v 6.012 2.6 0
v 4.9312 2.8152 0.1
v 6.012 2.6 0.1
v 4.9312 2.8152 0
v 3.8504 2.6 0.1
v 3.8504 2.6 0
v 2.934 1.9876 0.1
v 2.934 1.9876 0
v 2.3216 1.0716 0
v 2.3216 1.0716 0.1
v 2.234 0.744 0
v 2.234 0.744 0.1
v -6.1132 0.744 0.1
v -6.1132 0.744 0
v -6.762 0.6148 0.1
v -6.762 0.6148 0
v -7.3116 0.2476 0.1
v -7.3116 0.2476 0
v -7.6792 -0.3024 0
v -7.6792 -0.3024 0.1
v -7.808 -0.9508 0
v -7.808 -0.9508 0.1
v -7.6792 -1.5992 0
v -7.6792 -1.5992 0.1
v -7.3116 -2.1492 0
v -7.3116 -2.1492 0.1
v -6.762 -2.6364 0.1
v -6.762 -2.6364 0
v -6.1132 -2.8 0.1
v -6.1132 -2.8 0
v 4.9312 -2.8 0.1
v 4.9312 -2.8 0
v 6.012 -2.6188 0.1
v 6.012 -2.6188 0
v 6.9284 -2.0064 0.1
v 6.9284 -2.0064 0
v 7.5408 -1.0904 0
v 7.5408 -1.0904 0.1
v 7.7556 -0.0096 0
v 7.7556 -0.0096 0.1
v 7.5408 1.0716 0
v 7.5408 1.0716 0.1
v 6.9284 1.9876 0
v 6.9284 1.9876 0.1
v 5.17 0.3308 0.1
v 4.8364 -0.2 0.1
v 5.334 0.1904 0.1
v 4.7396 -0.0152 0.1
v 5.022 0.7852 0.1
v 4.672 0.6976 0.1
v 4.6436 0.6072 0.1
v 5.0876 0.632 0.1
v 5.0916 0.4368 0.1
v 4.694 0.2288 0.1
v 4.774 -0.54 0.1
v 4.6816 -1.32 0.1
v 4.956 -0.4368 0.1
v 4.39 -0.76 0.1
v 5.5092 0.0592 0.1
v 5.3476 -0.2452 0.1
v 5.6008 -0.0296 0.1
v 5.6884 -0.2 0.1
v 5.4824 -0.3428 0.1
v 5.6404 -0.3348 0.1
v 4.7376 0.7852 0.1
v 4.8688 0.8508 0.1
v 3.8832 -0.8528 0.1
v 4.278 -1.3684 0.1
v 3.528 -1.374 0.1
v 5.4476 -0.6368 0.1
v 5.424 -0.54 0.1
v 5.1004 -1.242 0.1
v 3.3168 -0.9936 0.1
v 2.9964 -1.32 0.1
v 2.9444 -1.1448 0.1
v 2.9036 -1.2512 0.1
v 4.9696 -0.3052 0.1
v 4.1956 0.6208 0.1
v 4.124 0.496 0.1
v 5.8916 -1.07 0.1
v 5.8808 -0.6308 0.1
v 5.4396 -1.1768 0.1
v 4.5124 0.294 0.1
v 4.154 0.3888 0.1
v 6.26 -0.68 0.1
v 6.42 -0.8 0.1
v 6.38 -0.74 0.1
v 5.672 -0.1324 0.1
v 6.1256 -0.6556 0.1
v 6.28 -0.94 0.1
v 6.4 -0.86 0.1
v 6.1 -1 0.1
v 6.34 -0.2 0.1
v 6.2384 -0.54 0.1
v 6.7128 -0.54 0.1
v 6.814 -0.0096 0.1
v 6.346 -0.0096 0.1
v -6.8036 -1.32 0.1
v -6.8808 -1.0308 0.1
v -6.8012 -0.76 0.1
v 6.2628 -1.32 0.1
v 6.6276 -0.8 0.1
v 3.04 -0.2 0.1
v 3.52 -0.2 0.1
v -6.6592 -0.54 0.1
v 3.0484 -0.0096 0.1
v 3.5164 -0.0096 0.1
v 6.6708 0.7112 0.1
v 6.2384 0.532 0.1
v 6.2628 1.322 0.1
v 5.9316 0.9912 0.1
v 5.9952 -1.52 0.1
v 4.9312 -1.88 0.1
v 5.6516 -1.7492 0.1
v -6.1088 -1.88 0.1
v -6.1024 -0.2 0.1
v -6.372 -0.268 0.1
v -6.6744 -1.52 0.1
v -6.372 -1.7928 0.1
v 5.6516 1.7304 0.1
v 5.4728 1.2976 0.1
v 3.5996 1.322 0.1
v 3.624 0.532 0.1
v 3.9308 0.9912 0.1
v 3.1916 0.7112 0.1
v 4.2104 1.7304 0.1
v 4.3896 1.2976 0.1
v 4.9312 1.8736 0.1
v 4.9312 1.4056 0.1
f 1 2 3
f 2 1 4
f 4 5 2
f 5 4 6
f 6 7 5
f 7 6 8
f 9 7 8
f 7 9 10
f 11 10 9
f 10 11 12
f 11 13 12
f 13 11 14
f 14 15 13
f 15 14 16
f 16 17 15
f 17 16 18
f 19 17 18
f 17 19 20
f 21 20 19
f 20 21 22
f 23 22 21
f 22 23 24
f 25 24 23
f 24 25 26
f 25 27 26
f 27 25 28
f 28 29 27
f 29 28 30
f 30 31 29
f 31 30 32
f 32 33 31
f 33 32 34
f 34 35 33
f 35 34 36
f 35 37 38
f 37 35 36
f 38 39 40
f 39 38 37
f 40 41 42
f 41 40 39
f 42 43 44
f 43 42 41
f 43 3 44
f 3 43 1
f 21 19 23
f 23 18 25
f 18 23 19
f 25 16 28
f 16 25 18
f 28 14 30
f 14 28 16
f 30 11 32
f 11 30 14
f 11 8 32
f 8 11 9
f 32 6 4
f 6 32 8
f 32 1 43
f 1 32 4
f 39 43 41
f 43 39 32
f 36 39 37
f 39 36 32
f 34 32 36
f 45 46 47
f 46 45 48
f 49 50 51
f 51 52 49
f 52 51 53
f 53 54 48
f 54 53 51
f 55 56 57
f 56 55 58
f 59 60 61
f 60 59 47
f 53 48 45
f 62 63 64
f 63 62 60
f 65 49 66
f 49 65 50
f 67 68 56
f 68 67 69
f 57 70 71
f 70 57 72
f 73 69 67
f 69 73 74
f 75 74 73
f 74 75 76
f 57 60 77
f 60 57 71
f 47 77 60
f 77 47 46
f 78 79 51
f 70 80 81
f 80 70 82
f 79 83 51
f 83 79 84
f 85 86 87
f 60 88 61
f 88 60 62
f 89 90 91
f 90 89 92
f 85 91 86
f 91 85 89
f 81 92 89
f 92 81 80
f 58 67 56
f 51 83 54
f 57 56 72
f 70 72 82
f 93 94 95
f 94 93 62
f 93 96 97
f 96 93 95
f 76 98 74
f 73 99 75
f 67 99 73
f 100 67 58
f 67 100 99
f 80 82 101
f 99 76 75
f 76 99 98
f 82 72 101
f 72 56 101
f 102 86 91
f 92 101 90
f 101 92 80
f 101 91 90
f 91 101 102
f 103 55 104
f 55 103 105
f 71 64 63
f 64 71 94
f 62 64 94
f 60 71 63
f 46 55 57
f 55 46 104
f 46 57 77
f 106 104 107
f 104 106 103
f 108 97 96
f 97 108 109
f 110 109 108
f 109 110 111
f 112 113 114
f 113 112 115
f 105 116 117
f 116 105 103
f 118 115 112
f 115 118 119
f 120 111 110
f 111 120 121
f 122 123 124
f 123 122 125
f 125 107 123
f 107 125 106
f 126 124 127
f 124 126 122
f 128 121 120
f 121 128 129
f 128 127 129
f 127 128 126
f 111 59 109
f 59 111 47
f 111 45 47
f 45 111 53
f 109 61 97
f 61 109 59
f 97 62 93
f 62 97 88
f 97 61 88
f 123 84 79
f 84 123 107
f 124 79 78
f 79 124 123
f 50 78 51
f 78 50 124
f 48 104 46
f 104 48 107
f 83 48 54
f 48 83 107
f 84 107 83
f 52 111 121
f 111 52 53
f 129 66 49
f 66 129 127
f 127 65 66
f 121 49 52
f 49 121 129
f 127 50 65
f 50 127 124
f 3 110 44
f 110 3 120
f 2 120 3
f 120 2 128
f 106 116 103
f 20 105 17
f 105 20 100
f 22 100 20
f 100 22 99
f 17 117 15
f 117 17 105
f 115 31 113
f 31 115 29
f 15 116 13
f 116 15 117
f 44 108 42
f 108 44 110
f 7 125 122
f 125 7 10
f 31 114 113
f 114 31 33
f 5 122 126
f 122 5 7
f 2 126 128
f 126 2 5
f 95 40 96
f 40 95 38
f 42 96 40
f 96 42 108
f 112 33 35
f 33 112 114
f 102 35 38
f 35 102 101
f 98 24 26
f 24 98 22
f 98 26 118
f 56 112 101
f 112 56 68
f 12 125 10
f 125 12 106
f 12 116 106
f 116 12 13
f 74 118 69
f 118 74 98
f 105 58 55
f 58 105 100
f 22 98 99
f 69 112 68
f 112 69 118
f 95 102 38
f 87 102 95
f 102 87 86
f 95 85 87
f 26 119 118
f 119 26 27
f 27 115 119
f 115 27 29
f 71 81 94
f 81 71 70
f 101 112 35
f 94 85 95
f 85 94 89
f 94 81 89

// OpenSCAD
use <../lib.scad>
function ldraw_lib__6153754p() = [
// 0 Sticker  0.7 x  1.9 with Black Surfer in Orange Sunset
// 0 Name: 6153754p.dat
// 0 Author: Magnus Forsberg [MagFors]
// 0 !LDRAW_ORG Part UPDATE 2016-01
// 0 !LICENSE Licensed under CC BY 4.0 : see CAreadme.txt
// 
// 0 BFC CERTIFY CCW
  [0,"BFC","CERTIFY"],
  [0,"BFC","CCW"],
// 
// 0 !KEYWORDS Beetle, set 10252, Volkswagen, VW
// 
// 0 !HISTORY 2016-12-31 [PTadmin] Official Update 2016-01
// 
// 
// 4 16 12.328 0 7.038 12.328 -0.25 7.038 15.03 -0.25 6.5 15.03 0 6.5
  [4,16,12.328,0,7.038,12.328,-0.25,7.038,15.03,-0.25,6.5,15.03,0,6.5],
// 4 16 9.626 0 6.5 9.626 -0.25 6.5 12.328 -0.25 7.038 12.328 0 7.038
  [4,16,9.626,0,6.5,9.626,-0.25,6.5,12.328,-0.25,7.038,12.328,0,7.038],
// 4 16 7.335 0 4.969 7.335 -0.25 4.969 9.626 -0.25 6.5 9.626 0 6.5
  [4,16,7.335,0,4.969,7.335,-0.25,4.969,9.626,-0.25,6.5,9.626,0,6.5],
// 4 16 5.804 0 2.679 5.804 -0.25 2.679 7.335 -0.25 4.969 7.335 0 4.969
  [4,16,5.804,0,2.679,5.804,-0.25,2.679,7.335,-0.25,4.969,7.335,0,4.969],
// 4 16 5.585 0 1.86 5.585 -0.25 1.86 5.804 -0.25 2.679 5.804 0 2.679
  [4,16,5.585,0,1.86,5.585,-0.25,1.86,5.804,-0.25,2.679,5.804,0,2.679],
// 4 16 -15.283 0 1.86 -15.283 -0.25 1.86 5.585 -0.25 1.86 5.585 0 1.86
  [4,16,-15.283,0,1.86,-15.283,-0.25,1.86,5.585,-0.25,1.86,5.585,0,1.86],
// 4 16 -16.905 0 1.537 -16.905 -0.25 1.537 -15.283 -0.25 1.86 -15.283 0 1.86
  [4,16,-16.905,0,1.537,-16.905,-0.25,1.537,-15.283,-0.25,1.86,-15.283,0,1.86],
// 4 16 -18.279 0 0.619 -18.279 -0.25 0.619 -16.905 -0.25 1.537 -16.905 0 1.537
  [4,16,-18.279,0,0.619,-18.279,-0.25,0.619,-16.905,-0.25,1.537,-16.905,0,1.537],
// 4 16 -19.198 0 -0.756 -19.198 -0.25 -0.756 -18.279 -0.25 0.619 -18.279 0 0.619
  [4,16,-19.198,0,-0.756,-19.198,-0.25,-0.756,-18.279,-0.25,0.619,-18.279,0,0.619],
// 4 16 -19.52 0 -2.377 -19.52 -0.25 -2.377 -19.198 -0.25 -0.756 -19.198 0 -0.756
  [4,16,-19.52,0,-2.377,-19.52,-0.25,-2.377,-19.198,-0.25,-0.756,-19.198,0,-0.756],
// 4 16 -19.198 0 -3.998 -19.198 -0.25 -3.998 -19.52 -0.25 -2.377 -19.52 0 -2.377
  [4,16,-19.198,0,-3.998,-19.198,-0.25,-3.998,-19.52,-0.25,-2.377,-19.52,0,-2.377],
// 4 16 -18.279 0 -5.373 -18.279 -0.25 -5.373 -19.198 -0.25 -3.998 -19.198 0 -3.998
  [4,16,-18.279,0,-5.373,-18.279,-0.25,-5.373,-19.198,-0.25,-3.998,-19.198,0,-3.998],
// 4 16 -16.905 0 -6.591 -16.905 -0.25 -6.591 -18.279 -0.25 -5.373 -18.279 0 -5.373
  [4,16,-16.905,0,-6.591,-16.905,-0.25,-6.591,-18.279,-0.25,-5.373,-18.279,0,-5.373],
// 4 16 -15.283 0 -7 -15.283 -0.25 -7 -16.905 -0.25 -6.591 -16.905 0 -6.591
  [4,16,-15.283,0,-7,-15.283,-0.25,-7,-16.905,-0.25,-6.591,-16.905,0,-6.591],
// 4 16 12.328 0 -7 12.328 -0.25 -7 -15.283 -0.25 -7 -15.283 0 -7
  [4,16,12.328,0,-7,12.328,-0.25,-7,-15.283,-0.25,-7,-15.283,0,-7],
// 4 16 15.03 0 -6.547 15.03 -0.25 -6.547 12.328 -0.25 -7 12.328 0 -7
  [4,16,15.03,0,-6.547,15.03,-0.25,-6.547,12.328,-0.25,-7,12.328,0,-7],
// 4 16 17.321 0 -5.016 17.321 -0.25 -5.016 15.03 -0.25 -6.547 15.03 0 -6.547
  [4,16,17.321,0,-5.016,17.321,-0.25,-5.016,15.03,-0.25,-6.547,15.03,0,-6.547],
// 4 16 18.852 0 -2.726 18.852 -0.25 -2.726 17.321 -0.25 -5.016 17.321 0 -5.016
  [4,16,18.852,0,-2.726,18.852,-0.25,-2.726,17.321,-0.25,-5.016,17.321,0,-5.016],
// 4 16 19.389 0 -0.024 19.389 -0.25 -0.024 18.852 -0.25 -2.726 18.852 0 -2.726
  [4,16,19.389,0,-0.024,19.389,-0.25,-0.024,18.852,-0.25,-2.726,18.852,0,-2.726],
// 4 16 18.852 0 2.679 18.852 -0.25 2.679 19.389 -0.25 -0.024 19.389 0 -0.024
  [4,16,18.852,0,2.679,18.852,-0.25,2.679,19.389,-0.25,-0.024,19.389,0,-0.024],
// 4 16 17.321 0 4.969 17.321 -0.25 4.969 18.852 -0.25 2.679 18.852 0 2.679
  [4,16,17.321,0,4.969,17.321,-0.25,4.969,18.852,-0.25,2.679,18.852,0,2.679],
// 4 16 15.03 0 6.5 15.03 -0.25 6.5 17.321 -0.25 4.969 17.321 0 4.969
  [4,16,15.03,0,6.5,15.03,-0.25,6.5,17.321,-0.25,4.969,17.321,0,4.969],
// 5 24 12.328 -0.25 7.038 12.328 0 7.038 9.626 -0.25 6.5 15.03 -0.25 6.5
  [5,24,12.328,-0.25,7.038,12.328,0,7.038,9.626,-0.25,6.5,15.03,-0.25,6.5],
// 5 24 9.626 -0.25 6.5 9.626 0 6.5 7.335 -0.25 4.969 12.328 -0.25 7.038
  [5,24,9.626,-0.25,6.5,9.626,0,6.5,7.335,-0.25,4.969,12.328,-0.25,7.038],
// 5 24 7.335 -0.25 4.969 7.335 0 4.969 5.804 -0.25 2.679 9.626 -0.25 6.5
  [5,24,7.335,-0.25,4.969,7.335,0,4.969,5.804,-0.25,2.679,9.626,-0.25,6.5],
// 5 24 5.804 -0.25 2.679 5.804 0 2.679 5.585 -0.25 1.86 7.335 -0.25 4.969
  [5,24,5.804,-0.25,2.679,5.804,0,2.679,5.585,-0.25,1.86,7.335,-0.25,4.969],
// 5 24 -15.283 -0.25 1.86 -15.283 0 1.86 -16.905 -0.25 1.537 5.585 -0.25 1.86
  [5,24,-15.283,-0.25,1.86,-15.283,0,1.86,-16.905,-0.25,1.537,5.585,-0.25,1.86],
// 5 24 -16.905 -0.25 1.537 -16.905 0 1.537 -18.279 -0.25 0.619 -15.283 -0.25 1.86
  [5,24,-16.905,-0.25,1.537,-16.905,0,1.537,-18.279,-0.25,0.619,-15.283,-0.25,1.86],
// 5 24 -18.279 -0.25 0.619 -18.279 0 0.619 -19.198 -0.25 -0.756 -16.905 -0.25 1.537
  [5,24,-18.279,-0.25,0.619,-18.279,0,0.619,-19.198,-0.25,-0.756,-16.905,-0.25,1.537],
// 5 24 -19.198 -0.25 -0.756 -19.198 0 -0.756 -19.52 -0.25 -2.377 -18.279 -0.25 0.619
  [5,24,-19.198,-0.25,-0.756,-19.198,0,-0.756,-19.52,-0.25,-2.377,-18.279,-0.25,0.619],
// 5 24 -19.52 -0.25 -2.377 -19.52 0 -2.377 -19.198 -0.25 -3.998 -19.198 -0.25 -0.756
  [5,24,-19.52,-0.25,-2.377,-19.52,0,-2.377,-19.198,-0.25,-3.998,-19.198,-0.25,-0.756],
// 5 24 -19.198 -0.25 -3.998 -19.198 0 -3.998 -18.279 -0.25 -5.373 -19.52 -0.25 -2.377
  [5,24,-19.198,-0.25,-3.998,-19.198,0,-3.998,-18.279,-0.25,-5.373,-19.52,-0.25,-2.377],
// 5 24 -18.279 -0.25 -5.373 -18.279 0 -5.373 -16.905 -0.25 -6.591 -19.198 -0.25 -3.998
  [5,24,-18.279,-0.25,-5.373,-18.279,0,-5.373,-16.905,-0.25,-6.591,-19.198,-0.25,-3.998],
// 5 24 -16.905 -0.25 -6.591 -16.905 0 -6.591 -15.283 -0.25 -7 -18.279 -0.25 -5.373
  [5,24,-16.905,-0.25,-6.591,-16.905,0,-6.591,-15.283,-0.25,-7,-18.279,-0.25,-5.373],
// 5 24 -15.283 -0.25 -7 -15.283 0 -7 12.328 -0.25 -7 -16.905 -0.25 -6.591
  [5,24,-15.283,-0.25,-7,-15.283,0,-7,12.328,-0.25,-7,-16.905,-0.25,-6.591],
// 5 24 12.328 -0.25 -7 12.328 0 -7 15.03 -0.25 -6.547 -15.283 -0.25 -7
  [5,24,12.328,-0.25,-7,12.328,0,-7,15.03,-0.25,-6.547,-15.283,-0.25,-7],
// 5 24 15.03 -0.25 -6.547 15.03 0 -6.547 17.321 -0.25 -5.016 12.328 -0.25 -7
  [5,24,15.03,-0.25,-6.547,15.03,0,-6.547,17.321,-0.25,-5.016,12.328,-0.25,-7],
// 5 24 17.321 -0.25 -5.016 17.321 0 -5.016 18.852 -0.25 -2.726 15.03 -0.25 -6.547
  [5,24,17.321,-0.25,-5.016,17.321,0,-5.016,18.852,-0.25,-2.726,15.03,-0.25,-6.547],
// 5 24 18.852 -0.25 -2.726 18.852 0 -2.726 19.389 -0.25 -0.024 17.321 -0.25 -5.016
  [5,24,18.852,-0.25,-2.726,18.852,0,-2.726,19.389,-0.25,-0.024,17.321,-0.25,-5.016],
// 5 24 19.389 -0.25 -0.024 19.389 0 -0.024 18.852 -0.25 2.679 18.852 -0.25 -2.726
  [5,24,19.389,-0.25,-0.024,19.389,0,-0.024,18.852,-0.25,2.679,18.852,-0.25,-2.726],
// 5 24 18.852 -0.25 2.679 18.852 0 2.679 17.321 -0.25 4.969 19.389 -0.25 -0.024
  [5,24,18.852,-0.25,2.679,18.852,0,2.679,17.321,-0.25,4.969,19.389,-0.25,-0.024],
// 5 24 17.321 -0.25 4.969 17.321 0 4.969 15.03 -0.25 6.5 18.852 -0.25 2.679
  [5,24,17.321,-0.25,4.969,17.321,0,4.969,15.03,-0.25,6.5,18.852,-0.25,2.679],
// 5 24 15.03 -0.25 6.5 15.03 0 6.5 17.321 -0.25 4.969 12.328 -0.25 7.038
  [5,24,15.03,-0.25,6.5,15.03,0,6.5,17.321,-0.25,4.969,12.328,-0.25,7.038],
// 
// 3 16 -19.52 0 -2.377 -19.198 0 -0.756 -19.198 0 -3.998
  [3,16,-19.52,0,-2.377,-19.198,0,-0.756,-19.198,0,-3.998],
// 4 16 -18.279 0 -5.373 -19.198 0 -3.998 -19.198 0 -0.756 -18.279 0 0.619
  [4,16,-18.279,0,-5.373,-19.198,0,-3.998,-19.198,0,-0.756,-18.279,0,0.619],
// 4 16 -18.279 0 -5.373 -18.279 0 0.619 -16.905 0 1.537 -16.905 0 -6.591
  [4,16,-18.279,0,-5.373,-18.279,0,0.619,-16.905,0,1.537,-16.905,0,-6.591],
// 4 16 -15.283 0 -7 -16.905 0 -6.591 -16.905 0 1.537 -15.283 0 1.86
  [4,16,-15.283,0,-7,-16.905,0,-6.591,-16.905,0,1.537,-15.283,0,1.86],
// 4 16 -15.283 0 1.86 5.585 0 1.86 12.328 0 -7 -15.283 0 -7
  [4,16,-15.283,0,1.86,5.585,0,1.86,12.328,0,-7,-15.283,0,-7],
// 4 16 12.328 0 -7 5.585 0 1.86 5.804 0 2.679 7.335 0 4.969
  [4,16,12.328,0,-7,5.585,0,1.86,5.804,0,2.679,7.335,0,4.969],
// 4 16 12.328 0 -7 7.335 0 4.969 9.626 0 6.5 12.328 0 7.038
  [4,16,12.328,0,-7,7.335,0,4.969,9.626,0,6.5,12.328,0,7.038],
// 4 16 12.328 0 -7 12.328 0 7.038 15.03 0 6.5 17.321 0 4.969
  [4,16,12.328,0,-7,12.328,0,7.038,15.03,0,6.5,17.321,0,4.969],
// 4 16 12.328 0 -7 17.321 0 4.969 18.852 0 2.679 19.389 0 -0.024
  [4,16,12.328,0,-7,17.321,0,4.969,18.852,0,2.679,19.389,0,-0.024],
// 4 16 12.328 0 -7 19.389 0 -0.024 18.852 0 -2.726 17.321 0 -5.016
  [4,16,12.328,0,-7,19.389,0,-0.024,18.852,0,-2.726,17.321,0,-5.016],
// 3 16 15.03 0 -6.547 12.328 0 -7 17.321 0 -5.016
  [3,16,15.03,0,-6.547,12.328,0,-7,17.321,0,-5.016],
// 
// 4 0 11.849 -0.25 -0.038 12.091 -0.25 -0.5 13.335 -0.25 0.476 12.925 -0.25 0.827
  [4,0,11.849,-0.25,-0.038,12.091,-0.25,-0.5,13.335,-0.25,0.476,12.925,-0.25,0.827],
// 3 0 12.555 -0.25 1.963 11.68 -0.25 1.744 11.609 -0.25 1.518
  [3,0,12.555,-0.25,1.963,11.68,-0.25,1.744,11.609,-0.25,1.518],
// 4 0 12.719 -0.25 1.58 12.555 -0.25 1.963 11.609 -0.25 1.518 12.729 -0.25 1.092
  [4,0,12.719,-0.25,1.58,12.555,-0.25,1.963,11.609,-0.25,1.518,12.729,-0.25,1.092],
// 4 0 12.729 -0.25 1.092 11.609 -0.25 1.518 11.735 -0.25 0.572 11.849 -0.25 -0.038
  [4,0,12.729,-0.25,1.092,11.609,-0.25,1.518,11.735,-0.25,0.572,11.849,-0.25,-0.038],
// 4 0 11.704 -0.25 -3.3 12.39 -0.25 -1.092 11.935 -0.25 -1.35 10.975 -0.25 -1.9
  [4,0,11.704,-0.25,-3.3,12.39,-0.25,-1.092,11.935,-0.25,-1.35,10.975,-0.25,-1.9],
// 4 0 13.773 -0.25 0.148 13.335 -0.25 0.476 13.369 -0.25 -0.613 14.002 -0.25 -0.074
  [4,0,13.773,-0.25,0.148,13.335,-0.25,0.476,13.369,-0.25,-0.613,14.002,-0.25,-0.074],
// 3 0 12.729 -0.25 1.092 11.849 -0.25 -0.038 12.925 -0.25 0.827
  [3,0,12.729,-0.25,1.092,11.849,-0.25,-0.038,12.925,-0.25,0.827],
// 4 0 14.221 -0.25 -0.5 13.369 -0.25 -0.613 13.706 -0.25 -0.857 14.101 -0.25 -0.837
  [4,0,14.221,-0.25,-0.5,13.369,-0.25,-0.613,13.706,-0.25,-0.857,14.101,-0.25,-0.837],
// 4 0 12.555 -0.25 1.963 12.172 -0.25 2.127 11.844 -0.25 1.963 11.68 -0.25 1.744
  [4,0,12.555,-0.25,1.963,12.172,-0.25,2.127,11.844,-0.25,1.963,11.68,-0.25,1.744],
// 4 0 9.708 -0.25 -2.132 8.82 -0.25 -3.435 10.695 -0.25 -3.421 11.704 -0.25 -3.3
  [4,0,9.708,-0.25,-2.132,8.82,-0.25,-3.435,10.695,-0.25,-3.421,11.704,-0.25,-3.3],
// 4 0 12.39 -0.25 -1.092 12.751 -0.25 -3.105 13.619 -0.25 -1.592 13.56 -0.25 -1.35
  [4,0,12.39,-0.25,-1.092,12.751,-0.25,-3.105,13.619,-0.25,-1.592,13.56,-0.25,-1.35],
// 4 0 8.292 -0.25 -2.484 7.491 -0.25 -3.3 8.82 -0.25 -3.435 9.708 -0.25 -2.132
  [4,0,8.292,-0.25,-2.484,7.491,-0.25,-3.3,8.82,-0.25,-3.435,9.708,-0.25,-2.132],
// 4 0 7.361 -0.25 -2.862 7.259 -0.25 -3.128 7.491 -0.25 -3.3 8.292 -0.25 -2.484
  [4,0,7.361,-0.25,-2.862,7.259,-0.25,-3.128,7.491,-0.25,-3.3,8.292,-0.25,-2.484],
// 4 0 13.369 -0.25 -0.613 12.424 -0.25 -0.763 12.39 -0.25 -1.092 13.56 -0.25 -1.35
  [4,0,13.369,-0.25,-0.613,12.424,-0.25,-0.763,12.39,-0.25,-1.092,13.56,-0.25,-1.35],
// 4 0 12.091 -0.25 -0.5 12.424 -0.25 -0.763 13.369 -0.25 -0.613 13.335 -0.25 0.476
  [4,0,12.091,-0.25,-0.5,12.424,-0.25,-0.763,13.369,-0.25,-0.613,13.335,-0.25,0.476],
// 3 0 10.489 -0.25 1.552 10.31 -0.25 1.24 11.609 -0.25 1.518
  [3,0,10.489,-0.25,1.552,10.31,-0.25,1.24,11.609,-0.25,1.518],
// 4 0 13.619 -0.25 -1.592 13.599 -0.25 -2.942 14.729 -0.25 -2.675 14.702 -0.25 -1.577
  [4,0,13.619,-0.25,-1.592,13.599,-0.25,-2.942,14.729,-0.25,-2.675,14.702,-0.25,-1.577],
// 4 0 10.385 -0.25 0.972 11.281 -0.25 0.735 11.609 -0.25 1.518 10.31 -0.25 1.24
  [4,0,10.385,-0.25,0.972,11.281,-0.25,0.735,11.609,-0.25,1.518,10.31,-0.25,1.24],
// 3 0 15.65 -0.25 -1.7 16.05 -0.25 -2 15.95 -0.25 -1.85
  [3,0,15.65,-0.25,-1.7,16.05,-0.25,-2,15.95,-0.25,-1.85],
// 4 0 14.18 -0.25 -0.331 14.002 -0.25 -0.074 13.369 -0.25 -0.613 14.221 -0.25 -0.5
  [4,0,14.18,-0.25,-0.331,14.002,-0.25,-0.074,13.369,-0.25,-0.613,14.221,-0.25,-0.5],
// 4 0 15.314 -0.25 -1.639 15.25 -0.25 -2.5 15.7 -0.25 -2.35 16 -0.25 -2.15
  [4,0,15.314,-0.25,-1.639,15.25,-0.25,-2.5,15.7,-0.25,-2.35,16,-0.25,-2.15],
// 4 0 15.65 -0.25 -1.7 15.314 -0.25 -1.639 16 -0.25 -2.15 16.05 -0.25 -2
  [4,0,15.65,-0.25,-1.7,15.314,-0.25,-1.639,16,-0.25,-2.15,16.05,-0.25,-2],
// 4 0 15.314 -0.25 -1.639 14.702 -0.25 -1.577 14.729 -0.25 -2.675 15.25 -0.25 -2.5
  [4,0,15.314,-0.25,-1.639,14.702,-0.25,-1.577,14.729,-0.25,-2.675,15.25,-0.25,-2.5],
// 3 0 10.975 -0.25 -1.9 9.708 -0.25 -2.132 11.704 -0.25 -3.3
  [3,0,10.975,-0.25,-1.9,9.708,-0.25,-2.132,11.704,-0.25,-3.3],
// 3 0 11.609 -0.25 1.518 11.281 -0.25 0.735 11.735 -0.25 0.572
  [3,0,11.609,-0.25,1.518,11.281,-0.25,0.735,11.735,-0.25,0.572],
// 3 0 12.39 -0.25 -1.092 11.704 -0.25 -3.3 12.751 -0.25 -3.105
  [3,0,12.39,-0.25,-1.092,11.704,-0.25,-3.3,12.751,-0.25,-3.105],
// 3 0 13.619 -0.25 -1.592 12.751 -0.25 -3.105 13.599 -0.25 -2.942
  [3,0,13.619,-0.25,-1.592,12.751,-0.25,-3.105,13.599,-0.25,-2.942],
// 4 15 15.596 -0.25 -1.35 16.782 -0.25 -1.35 15.85 -0.25 -0.5 14.221 -0.25 -0.5
  [4,15,15.596,-0.25,-1.35,16.782,-0.25,-1.35,15.85,-0.25,-0.5,14.221,-0.25,-0.5],
// 4 15 15.865 -0.25 -0.024 15.85 -0.25 -0.5 16.782 -0.25 -1.35 17.035 -0.25 -0.024
  [4,15,15.865,-0.25,-0.024,15.85,-0.25,-0.5,16.782,-0.25,-1.35,17.035,-0.25,-0.024],
// 3 15 7.259 -0.25 -3.128 -17.009 -0.25 -3.3 7.491 -0.25 -3.3
  [3,15,7.259,-0.25,-3.128,-17.009,-0.25,-3.3,7.491,-0.25,-3.3],
// 3 15 8.292 -0.25 -2.484 -17.202 -0.25 -2.577 7.361 -0.25 -2.862
  [3,15,8.292,-0.25,-2.484,-17.202,-0.25,-2.577,7.361,-0.25,-2.862],
// 3 15 9.708 -0.25 -2.132 -17.202 -0.25 -2.577 8.292 -0.25 -2.484
  [3,15,9.708,-0.25,-2.132,-17.202,-0.25,-2.577,8.292,-0.25,-2.484],
// 4 15 -17.003 -0.25 -1.9 -17.202 -0.25 -2.577 9.708 -0.25 -2.132 10.975 -0.25 -1.9
  [4,15,-17.003,-0.25,-1.9,-17.202,-0.25,-2.577,9.708,-0.25,-2.132,10.975,-0.25,-1.9],
// 3 15 14.729 -0.25 -2.675 13.599 -0.25 -2.942 15.657 -0.25 -3.3
  [3,15,14.729,-0.25,-2.675,13.599,-0.25,-2.942,15.657,-0.25,-3.3],
// 4 15 -17.009 -0.25 -3.3 7.259 -0.25 -3.128 7.361 -0.25 -2.862 -17.202 -0.25 -2.577
  [4,15,-17.009,-0.25,-3.3,7.259,-0.25,-3.128,7.361,-0.25,-2.862,-17.202,-0.25,-2.577],
// 3 15 13.599 -0.25 -2.942 12.751 -0.25 -3.105 15.657 -0.25 -3.3
  [3,15,13.599,-0.25,-2.942,12.751,-0.25,-3.105,15.657,-0.25,-3.3],
// 3 15 12.751 -0.25 -3.105 11.704 -0.25 -3.3 15.657 -0.25 -3.3
  [3,15,12.751,-0.25,-3.105,11.704,-0.25,-3.3,15.657,-0.25,-3.3],
// 3 15 16.569 -0.25 -2 16.05 -0.25 -2 16 -0.25 -2.15
  [3,15,16.569,-0.25,-2,16.05,-0.25,-2,16,-0.25,-2.15],
// 4 15 15.25 -0.25 -2.5 14.729 -0.25 -2.675 15.657 -0.25 -3.3 15.7 -0.25 -2.35
  [4,15,15.25,-0.25,-2.5,14.729,-0.25,-2.675,15.657,-0.25,-3.3,15.7,-0.25,-2.35],
// 4 15 16 -0.25 -2.15 15.7 -0.25 -2.35 15.657 -0.25 -3.3 16.569 -0.25 -2
  [4,15,16,-0.25,-2.15,15.7,-0.25,-2.35,15.657,-0.25,-3.3,16.569,-0.25,-2],
// 4 15 11.935 -0.25 -1.35 8.8 -0.25 -0.5 7.6 -0.25 -0.5 -16.648 -0.25 -1.35
  [4,15,11.935,-0.25,-1.35,8.8,-0.25,-0.5,7.6,-0.25,-0.5,-16.648,-0.25,-1.35],
// 4 15 14.101 -0.25 -0.837 13.706 -0.25 -0.857 13.56 -0.25 -1.35 15.596 -0.25 -1.35
  [4,15,14.101,-0.25,-0.837,13.706,-0.25,-0.857,13.56,-0.25,-1.35,15.596,-0.25,-1.35],
// 3 15 14.221 -0.25 -0.5 14.101 -0.25 -0.837 15.596 -0.25 -1.35
  [3,15,14.221,-0.25,-0.5,14.101,-0.25,-0.837,15.596,-0.25,-1.35],
// 3 15 13.369 -0.25 -0.613 13.56 -0.25 -1.35 13.706 -0.25 -0.857
  [3,15,13.369,-0.25,-0.613,13.56,-0.25,-1.35,13.706,-0.25,-0.857],
// 4 15 12.091 -0.25 -0.5 8.8 -0.25 -0.5 11.935 -0.25 -1.35 12.39 -0.25 -1.092
  [4,15,12.091,-0.25,-0.5,8.8,-0.25,-0.5,11.935,-0.25,-1.35,12.39,-0.25,-1.092],
// 3 15 12.091 -0.25 -0.5 12.39 -0.25 -1.092 12.424 -0.25 -0.763
  [3,15,12.091,-0.25,-0.5,12.39,-0.25,-1.092,12.424,-0.25,-0.763],
// 4 15 8.791 -0.25 -0.024 7.621 -0.25 -0.024 7.6 -0.25 -0.5 8.8 -0.25 -0.5
  [4,15,8.791,-0.25,-0.024,7.621,-0.25,-0.024,7.6,-0.25,-0.5,8.8,-0.25,-0.5],
// 4 15 15.596 -0.25 1.33 15.865 -0.25 -0.024 17.035 -0.25 -0.024 16.677 -0.25 1.778
  [4,15,15.596,-0.25,1.33,15.865,-0.25,-0.024,17.035,-0.25,-0.024,16.677,-0.25,1.778],
// 4 15 14.829 -0.25 2.478 15.596 -0.25 1.33 16.677 -0.25 1.778 15.657 -0.25 3.305
  [4,15,14.829,-0.25,2.478,15.596,-0.25,1.33,16.677,-0.25,1.778,15.657,-0.25,3.305],
// 4 15 12.328 -0.25 -4.7 14.129 -0.25 -4.373 14.988 -0.25 -3.8 -15.272 -0.25 -4.7
  [4,15,12.328,-0.25,-4.7,14.129,-0.25,-4.373,14.988,-0.25,-3.8,-15.272,-0.25,-4.7],
// 4 15 -15.256 -0.25 -0.5 -15.93 -0.25 -0.67 -16.648 -0.25 -1.35 7.6 -0.25 -0.5
  [4,15,-15.256,-0.25,-0.5,-15.93,-0.25,-0.67,-16.648,-0.25,-1.35,7.6,-0.25,-0.5],
// 4 15 -16.686 -0.25 -3.8 -15.93 -0.25 -4.482 -15.272 -0.25 -4.7 14.988 -0.25 -3.8
  [4,15,-16.686,-0.25,-3.8,-15.93,-0.25,-4.482,-15.272,-0.25,-4.7,14.988,-0.25,-3.8],
// 4 15 13.682 -0.25 3.244 14.829 -0.25 2.478 15.657 -0.25 3.305 14.129 -0.25 4.326
  [4,15,13.682,-0.25,3.244,14.829,-0.25,2.478,15.657,-0.25,3.305,14.129,-0.25,4.326],
// 4 15 8.999 -0.25 3.305 7.979 -0.25 1.778 9.06 -0.25 1.33 9.827 -0.25 2.478
  [4,15,8.999,-0.25,3.305,7.979,-0.25,1.778,9.06,-0.25,1.33,9.827,-0.25,2.478],
// 4 15 7.979 -0.25 1.778 7.621 -0.25 -0.024 8.791 -0.25 -0.024 9.06 -0.25 1.33
  [4,15,7.979,-0.25,1.778,7.621,-0.25,-0.024,8.791,-0.25,-0.024,9.06,-0.25,1.33],
// 4 15 8.999 -0.25 3.305 9.827 -0.25 2.478 10.974 -0.25 3.244 10.526 -0.25 4.326
  [4,15,8.999,-0.25,3.305,9.827,-0.25,2.478,10.974,-0.25,3.244,10.526,-0.25,4.326],
// 4 15 12.328 -0.25 4.684 12.328 -0.25 3.514 13.682 -0.25 3.244 14.129 -0.25 4.326
  [4,15,12.328,-0.25,4.684,12.328,-0.25,3.514,13.682,-0.25,3.244,14.129,-0.25,4.326],
// 4 15 10.526 -0.25 4.326 10.974 -0.25 3.244 12.328 -0.25 3.514 12.328 -0.25 4.684
  [4,15,10.526,-0.25,4.326,10.974,-0.25,3.244,12.328,-0.25,3.514,12.328,-0.25,4.684],
// 4 25 15.596 -0.25 1.33 14.829 -0.25 2.478 13.335 -0.25 0.476 13.773 -0.25 0.148
  [4,25,15.596,-0.25,1.33,14.829,-0.25,2.478,13.335,-0.25,0.476,13.773,-0.25,0.148],
// 4 25 14.829 -0.25 2.478 12.729 -0.25 1.092 12.925 -0.25 0.827 13.335 -0.25 0.476
  [4,25,14.829,-0.25,2.478,12.729,-0.25,1.092,12.925,-0.25,0.827,13.335,-0.25,0.476],
// 4 25 15.596 -0.25 1.33 13.773 -0.25 0.148 14.002 -0.25 -0.074 15.865 -0.25 -0.024
  [4,25,15.596,-0.25,1.33,13.773,-0.25,0.148,14.002,-0.25,-0.074,15.865,-0.25,-0.024],
// 4 25 14.18 -0.25 -0.331 14.221 -0.25 -0.5 15.85 -0.25 -0.5 15.865 -0.25 -0.024
  [4,25,14.18,-0.25,-0.331,14.221,-0.25,-0.5,15.85,-0.25,-0.5,15.865,-0.25,-0.024],
// 3 25 15.865 -0.25 -0.024 14.002 -0.25 -0.074 14.18 -0.25 -0.331
  [3,25,15.865,-0.25,-0.024,14.002,-0.25,-0.074,14.18,-0.25,-0.331],
// 4 25 9.06 -0.25 1.33 8.791 -0.25 -0.024 10.385 -0.25 0.972 10.31 -0.25 1.24
  [4,25,9.06,-0.25,1.33,8.791,-0.25,-0.024,10.385,-0.25,0.972,10.31,-0.25,1.24],
// 4 25 9.827 -0.25 2.478 9.06 -0.25 1.33 10.31 -0.25 1.24 10.489 -0.25 1.552
  [4,25,9.827,-0.25,2.478,9.06,-0.25,1.33,10.31,-0.25,1.24,10.489,-0.25,1.552],
// 4 25 9.827 -0.25 2.478 10.489 -0.25 1.552 11.609 -0.25 1.518 11.68 -0.25 1.744
  [4,25,9.827,-0.25,2.478,10.489,-0.25,1.552,11.609,-0.25,1.518,11.68,-0.25,1.744],
// 4 25 12.091 -0.25 -0.5 11.849 -0.25 -0.038 8.791 -0.25 -0.024 8.8 -0.25 -0.5
  [4,25,12.091,-0.25,-0.5,11.849,-0.25,-0.038,8.791,-0.25,-0.024,8.8,-0.25,-0.5],
// 4 25 8.791 -0.25 -0.024 11.849 -0.25 -0.038 11.735 -0.25 0.572 11.281 -0.25 0.735
  [4,25,8.791,-0.25,-0.024,11.849,-0.25,-0.038,11.735,-0.25,0.572,11.281,-0.25,0.735],
// 3 25 10.385 -0.25 0.972 8.791 -0.25 -0.024 11.281 -0.25 0.735
  [3,25,10.385,-0.25,0.972,8.791,-0.25,-0.024,11.281,-0.25,0.735],
// 4 25 13.682 -0.25 3.244 12.719 -0.25 1.58 12.729 -0.25 1.092 14.829 -0.25 2.478
  [4,25,13.682,-0.25,3.244,12.719,-0.25,1.58,12.729,-0.25,1.092,14.829,-0.25,2.478],
// 4 25 12.172 -0.25 2.127 12.555 -0.25 1.963 12.328 -0.25 3.514 10.974 -0.25 3.244
  [4,25,12.172,-0.25,2.127,12.555,-0.25,1.963,12.328,-0.25,3.514,10.974,-0.25,3.244],
// 3 25 10.974 -0.25 3.244 11.844 -0.25 1.963 12.172 -0.25 2.127
  [3,25,10.974,-0.25,3.244,11.844,-0.25,1.963,12.172,-0.25,2.127],
// 4 25 13.682 -0.25 3.244 12.328 -0.25 3.514 12.555 -0.25 1.963 12.719 -0.25 1.58
  [4,25,13.682,-0.25,3.244,12.328,-0.25,3.514,12.555,-0.25,1.963,12.719,-0.25,1.58],
// 4 25 9.827 -0.25 2.478 11.68 -0.25 1.744 11.844 -0.25 1.963 10.974 -0.25 3.244
  [4,25,9.827,-0.25,2.478,11.68,-0.25,1.744,11.844,-0.25,1.963,10.974,-0.25,3.244],
// 4 321 15.03 -0.25 6.5 14.129 -0.25 4.326 15.657 -0.25 3.305 17.321 -0.25 4.969
  [4,321,15.03,-0.25,6.5,14.129,-0.25,4.326,15.657,-0.25,3.305,17.321,-0.25,4.969],
// 4 321 12.328 -0.25 7.038 12.328 -0.25 4.684 14.129 -0.25 4.326 15.03 -0.25 6.5
  [4,321,12.328,-0.25,7.038,12.328,-0.25,4.684,14.129,-0.25,4.326,15.03,-0.25,6.5],
// 3 321 7.621 -0.25 -0.024 -15.256 -0.25 -0.5 7.6 -0.25 -0.5
  [3,321,7.621,-0.25,-0.024,-15.256,-0.25,-0.5,7.6,-0.25,-0.5],
// 4 321 -16.648 -0.25 -1.35 -18.279 -0.25 0.619 -19.198 -0.25 -0.756 -17.003 -0.25 -1.9
  [4,321,-16.648,-0.25,-1.35,-18.279,-0.25,0.619,-19.198,-0.25,-0.756,-17.003,-0.25,-1.9],
// 4 321 -19.198 -0.25 -0.756 -19.52 -0.25 -2.377 -17.202 -0.25 -2.577 -17.003 -0.25 -1.9
  [4,321,-19.198,-0.25,-0.756,-19.52,-0.25,-2.377,-17.202,-0.25,-2.577,-17.003,-0.25,-1.9],
// 4 321 -18.279 -0.25 0.619 -16.648 -0.25 -1.35 -15.93 -0.25 -0.67 -16.905 -0.25 1.537
  [4,321,-18.279,-0.25,0.619,-16.648,-0.25,-1.35,-15.93,-0.25,-0.67,-16.905,-0.25,1.537],
// 4 321 12.328 -0.25 -4.7 -15.272 -0.25 -4.7 -15.283 -0.25 -7 12.328 -0.25 -7
  [4,321,12.328,-0.25,-4.7,-15.272,-0.25,-4.7,-15.283,-0.25,-7,12.328,-0.25,-7],
// 4 321 -16.905 -0.25 1.537 -15.93 -0.25 -0.67 -15.256 -0.25 -0.5 -15.283 -0.25 1.86
  [4,321,-16.905,-0.25,1.537,-15.93,-0.25,-0.67,-15.256,-0.25,-0.5,-15.283,-0.25,1.86],
// 4 321 17.321 -0.25 4.969 15.657 -0.25 3.305 16.677 -0.25 1.778 18.852 -0.25 2.679
  [4,321,17.321,-0.25,4.969,15.657,-0.25,3.305,16.677,-0.25,1.778,18.852,-0.25,2.679],
// 4 321 5.804 -0.25 2.679 7.979 -0.25 1.778 8.999 -0.25 3.305 7.335 -0.25 4.969
  [4,321,5.804,-0.25,2.679,7.979,-0.25,1.778,8.999,-0.25,3.305,7.335,-0.25,4.969],
// 4 321 15.03 -0.25 -6.547 14.129 -0.25 -4.373 12.328 -0.25 -4.7 12.328 -0.25 -7
  [4,321,15.03,-0.25,-6.547,14.129,-0.25,-4.373,12.328,-0.25,-4.7,12.328,-0.25,-7],
// 4 321 7.335 -0.25 4.969 8.999 -0.25 3.305 10.526 -0.25 4.326 9.626 -0.25 6.5
  [4,321,7.335,-0.25,4.969,8.999,-0.25,3.305,10.526,-0.25,4.326,9.626,-0.25,6.5],
// 4 321 9.626 -0.25 6.5 10.526 -0.25 4.326 12.328 -0.25 4.684 12.328 -0.25 7.038
  [4,321,9.626,-0.25,6.5,10.526,-0.25,4.326,12.328,-0.25,4.684,12.328,-0.25,7.038],
// 4 321 16.782 -0.25 -1.35 18.852 -0.25 -2.726 19.389 -0.25 -0.024 17.035 -0.25 -0.024
  [4,321,16.782,-0.25,-1.35,18.852,-0.25,-2.726,19.389,-0.25,-0.024,17.035,-0.25,-0.024],
// 4 321 18.852 -0.25 2.679 16.677 -0.25 1.778 17.035 -0.25 -0.024 19.389 -0.25 -0.024
  [4,321,18.852,-0.25,2.679,16.677,-0.25,1.778,17.035,-0.25,-0.024,19.389,-0.25,-0.024],
// 4 321 14.129 -0.25 -4.373 15.03 -0.25 -6.547 17.321 -0.25 -5.016 14.988 -0.25 -3.8
  [4,321,14.129,-0.25,-4.373,15.03,-0.25,-6.547,17.321,-0.25,-5.016,14.988,-0.25,-3.8],
// 4 321 15.657 -0.25 -3.3 17.321 -0.25 -5.016 18.852 -0.25 -2.726 16.569 -0.25 -2
  [4,321,15.657,-0.25,-3.3,17.321,-0.25,-5.016,18.852,-0.25,-2.726,16.569,-0.25,-2],
// 4 321 -17.009 -0.25 -3.3 -19.52 -0.25 -2.377 -19.198 -0.25 -3.998 -18.279 -0.25 -5.373
  [4,321,-17.009,-0.25,-3.3,-19.52,-0.25,-2.377,-19.198,-0.25,-3.998,-18.279,-0.25,-5.373],
// 3 321 -17.009 -0.25 -3.3 -18.279 -0.25 -5.373 -16.686 -0.25 -3.8
  [3,321,-17.009,-0.25,-3.3,-18.279,-0.25,-5.373,-16.686,-0.25,-3.8],
// 4 321 14.988 -0.25 -3.8 15.657 -0.25 -3.3 11.704 -0.25 -3.3 10.695 -0.25 -3.421
  [4,321,14.988,-0.25,-3.8,15.657,-0.25,-3.3,11.704,-0.25,-3.3,10.695,-0.25,-3.421],
// 4 321 5.585 -0.25 1.86 7.621 -0.25 -0.024 7.979 -0.25 1.778 5.804 -0.25 2.679
  [4,321,5.585,-0.25,1.86,7.621,-0.25,-0.024,7.979,-0.25,1.778,5.804,-0.25,2.679],
// 4 321 5.585 -0.25 1.86 -15.283 -0.25 1.86 -15.256 -0.25 -0.5 7.621 -0.25 -0.024
  [4,321,5.585,-0.25,1.86,-15.283,-0.25,1.86,-15.256,-0.25,-0.5,7.621,-0.25,-0.024],
// 4 321 7.491 -0.25 -3.3 -17.009 -0.25 -3.3 -16.686 -0.25 -3.8 8.82 -0.25 -3.435
  [4,321,7.491,-0.25,-3.3,-17.009,-0.25,-3.3,-16.686,-0.25,-3.8,8.82,-0.25,-3.435],
// 4 321 11.935 -0.25 -1.35 -16.648 -0.25 -1.35 -17.003 -0.25 -1.9 10.975 -0.25 -1.9
  [4,321,11.935,-0.25,-1.35,-16.648,-0.25,-1.35,-17.003,-0.25,-1.9,10.975,-0.25,-1.9],
// 3 321 -19.52 -0.25 -2.377 -17.009 -0.25 -3.3 -17.202 -0.25 -2.577
  [3,321,-19.52,-0.25,-2.377,-17.009,-0.25,-3.3,-17.202,-0.25,-2.577],
// 4 321 14.988 -0.25 -3.8 10.695 -0.25 -3.421 8.82 -0.25 -3.435 -16.686 -0.25 -3.8
  [4,321,14.988,-0.25,-3.8,10.695,-0.25,-3.421,8.82,-0.25,-3.435,-16.686,-0.25,-3.8],
// 3 321 16.782 -0.25 -1.35 16.569 -0.25 -2 18.852 -0.25 -2.726
  [3,321,16.782,-0.25,-1.35,16.569,-0.25,-2,18.852,-0.25,-2.726],
// 4 321 16.782 -0.25 -1.35 15.95 -0.25 -1.85 16.05 -0.25 -2 16.569 -0.25 -2
  [4,321,16.782,-0.25,-1.35,15.95,-0.25,-1.85,16.05,-0.25,-2,16.569,-0.25,-2],
// 3 321 16.782 -0.25 -1.35 15.65 -0.25 -1.7 15.95 -0.25 -1.85
  [3,321,16.782,-0.25,-1.35,15.65,-0.25,-1.7,15.95,-0.25,-1.85],
// 4 321 -16.686 -0.25 -3.8 -18.279 -0.25 -5.373 -16.905 -0.25 -6.591 -15.93 -0.25 -4.482
  [4,321,-16.686,-0.25,-3.8,-18.279,-0.25,-5.373,-16.905,-0.25,-6.591,-15.93,-0.25,-4.482],
// 4 321 -15.93 -0.25 -4.482 -16.905 -0.25 -6.591 -15.283 -0.25 -7 -15.272 -0.25 -4.7
  [4,321,-15.93,-0.25,-4.482,-16.905,-0.25,-6.591,-15.283,-0.25,-7,-15.272,-0.25,-4.7],
// 4 321 13.56 -0.25 -1.35 13.619 -0.25 -1.592 14.702 -0.25 -1.577 15.596 -0.25 -1.35
  [4,321,13.56,-0.25,-1.35,13.619,-0.25,-1.592,14.702,-0.25,-1.577,15.596,-0.25,-1.35],
// 3 321 15.657 -0.25 -3.3 14.988 -0.25 -3.8 17.321 -0.25 -5.016
  [3,321,15.657,-0.25,-3.3,14.988,-0.25,-3.8,17.321,-0.25,-5.016],
// 4 321 15.596 -0.25 -1.35 15.314 -0.25 -1.639 15.65 -0.25 -1.7 16.782 -0.25 -1.35
  [4,321,15.596,-0.25,-1.35,15.314,-0.25,-1.639,15.65,-0.25,-1.7,16.782,-0.25,-1.35],
// 3 321 15.596 -0.25 -1.35 14.702 -0.25 -1.577 15.314 -0.25 -1.639
  [3,321,15.596,-0.25,-1.35,14.702,-0.25,-1.577,15.314,-0.25,-1.639],
];
module ldraw_lib__6153754p(step=0, col=false, unit=2/5, alt=false, line=0.2, solid=!$preview)
    makepoly(ldraw_lib__6153754p(), step=step, col=col, unit=unit, alt=alt, line=line, solid=solid);
ldraw_lib__6153754p(line=0.2);
